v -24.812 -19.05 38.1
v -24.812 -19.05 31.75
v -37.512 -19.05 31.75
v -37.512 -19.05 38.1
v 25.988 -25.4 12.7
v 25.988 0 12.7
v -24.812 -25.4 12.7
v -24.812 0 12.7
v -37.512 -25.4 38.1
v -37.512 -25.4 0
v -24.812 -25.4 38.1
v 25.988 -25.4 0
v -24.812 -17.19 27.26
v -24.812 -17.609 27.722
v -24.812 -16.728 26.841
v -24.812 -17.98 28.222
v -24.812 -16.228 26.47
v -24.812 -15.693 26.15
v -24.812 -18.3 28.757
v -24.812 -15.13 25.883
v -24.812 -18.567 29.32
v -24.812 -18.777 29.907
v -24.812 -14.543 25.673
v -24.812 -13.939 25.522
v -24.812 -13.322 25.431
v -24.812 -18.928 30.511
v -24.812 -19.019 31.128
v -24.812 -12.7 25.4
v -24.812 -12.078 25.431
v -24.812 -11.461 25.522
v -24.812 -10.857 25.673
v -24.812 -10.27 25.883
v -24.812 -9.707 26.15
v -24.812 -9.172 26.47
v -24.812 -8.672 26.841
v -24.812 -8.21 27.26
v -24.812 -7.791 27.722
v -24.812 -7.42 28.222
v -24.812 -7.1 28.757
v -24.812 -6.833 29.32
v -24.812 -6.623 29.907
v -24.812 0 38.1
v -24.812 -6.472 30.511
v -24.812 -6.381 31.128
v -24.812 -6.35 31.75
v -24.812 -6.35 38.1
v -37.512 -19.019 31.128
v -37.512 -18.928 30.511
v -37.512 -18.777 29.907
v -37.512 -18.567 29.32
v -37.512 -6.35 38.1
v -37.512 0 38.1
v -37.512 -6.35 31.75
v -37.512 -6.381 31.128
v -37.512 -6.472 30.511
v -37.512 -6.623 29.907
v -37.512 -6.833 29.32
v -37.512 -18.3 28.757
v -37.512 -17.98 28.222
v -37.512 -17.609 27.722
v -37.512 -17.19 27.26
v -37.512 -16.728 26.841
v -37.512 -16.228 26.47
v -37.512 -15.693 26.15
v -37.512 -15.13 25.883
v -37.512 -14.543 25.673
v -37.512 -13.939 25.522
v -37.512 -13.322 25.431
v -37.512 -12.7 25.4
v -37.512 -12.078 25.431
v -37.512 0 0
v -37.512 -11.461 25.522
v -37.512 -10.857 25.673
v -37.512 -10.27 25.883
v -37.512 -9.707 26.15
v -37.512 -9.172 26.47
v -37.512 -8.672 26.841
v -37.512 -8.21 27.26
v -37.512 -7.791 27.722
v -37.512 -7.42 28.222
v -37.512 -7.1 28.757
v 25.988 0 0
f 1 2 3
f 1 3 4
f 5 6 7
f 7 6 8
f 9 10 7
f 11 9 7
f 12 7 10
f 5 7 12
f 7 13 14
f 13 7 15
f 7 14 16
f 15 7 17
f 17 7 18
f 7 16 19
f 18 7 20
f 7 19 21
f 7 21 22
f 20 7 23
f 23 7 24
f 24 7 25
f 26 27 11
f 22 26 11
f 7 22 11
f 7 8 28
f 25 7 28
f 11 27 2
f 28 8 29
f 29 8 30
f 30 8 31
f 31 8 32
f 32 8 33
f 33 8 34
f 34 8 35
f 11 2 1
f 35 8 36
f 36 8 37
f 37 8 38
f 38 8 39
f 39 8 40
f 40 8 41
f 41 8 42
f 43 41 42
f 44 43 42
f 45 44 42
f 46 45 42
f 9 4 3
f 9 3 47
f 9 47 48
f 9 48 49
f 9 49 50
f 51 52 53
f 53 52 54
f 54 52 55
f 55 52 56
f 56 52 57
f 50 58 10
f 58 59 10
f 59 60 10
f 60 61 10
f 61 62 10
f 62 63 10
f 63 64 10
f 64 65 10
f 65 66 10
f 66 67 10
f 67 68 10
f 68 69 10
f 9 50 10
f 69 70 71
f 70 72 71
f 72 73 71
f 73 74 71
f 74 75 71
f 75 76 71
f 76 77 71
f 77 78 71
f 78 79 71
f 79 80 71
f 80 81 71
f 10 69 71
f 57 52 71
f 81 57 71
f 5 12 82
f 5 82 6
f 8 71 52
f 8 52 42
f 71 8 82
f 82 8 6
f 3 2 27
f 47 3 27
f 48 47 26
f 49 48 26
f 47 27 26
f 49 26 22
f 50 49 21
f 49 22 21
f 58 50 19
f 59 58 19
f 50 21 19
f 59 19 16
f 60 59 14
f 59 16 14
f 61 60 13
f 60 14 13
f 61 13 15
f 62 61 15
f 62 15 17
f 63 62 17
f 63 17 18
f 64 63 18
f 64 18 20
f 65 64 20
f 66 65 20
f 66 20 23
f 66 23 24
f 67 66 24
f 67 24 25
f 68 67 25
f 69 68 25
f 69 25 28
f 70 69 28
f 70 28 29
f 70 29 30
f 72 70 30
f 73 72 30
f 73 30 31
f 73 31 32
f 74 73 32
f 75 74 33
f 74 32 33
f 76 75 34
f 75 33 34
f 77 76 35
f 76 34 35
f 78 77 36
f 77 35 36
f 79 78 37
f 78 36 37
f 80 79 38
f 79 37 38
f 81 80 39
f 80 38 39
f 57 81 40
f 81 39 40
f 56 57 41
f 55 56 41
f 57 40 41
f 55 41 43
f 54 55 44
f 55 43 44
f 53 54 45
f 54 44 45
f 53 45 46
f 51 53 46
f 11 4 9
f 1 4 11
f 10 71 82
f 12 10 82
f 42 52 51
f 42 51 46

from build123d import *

# Parameters (mm, degrees)
F0_W     = 12.7
F0_H     = 25.4
F1_DEPTH = 25.4
F2_DEPTH = 25.4
F3_W     = 12.7
F3_H     = 6.35
F4_DEPTH = 25.4


with BuildPart() as f1:
    # F0 (on Front) → F1 (new body)
    with BuildSketch(Plane.XZ):
        Polygon((-37.512038, 12.7), (-37.512038, 0), (25.987962, 0), (25.987962, 12.7), (-24.812038, 12.7), align=None)
        with Locations((-31.162038, 25.4)):
            Rectangle(F0_W, F0_H)
    extrude(amount=F1_DEPTH)

    # F0 (on Front) → F2 (join)
    with BuildSketch(Plane.XZ):
        Polygon((-37.512038, 12.7), (-37.512038, 0), (25.987962, 0), (25.987962, 12.7), (-24.812038, 12.7), align=None)
        with Locations((-31.162038, 25.4)):
            Rectangle(F0_W, F0_H)
    extrude(amount=F2_DEPTH)

    # F3 (on face) → F4 (cut)
    with BuildSketch(Plane.YZ.offset(-24.812038)):
        with BuildLine():
            ThreePointArc((-19.05, 31.75), (-12.7, 25.4), (-6.35, 31.75))
            Line((-6.35, 31.75), (-19.05, 31.75))
        make_face()
        with Locations((-12.7, 34.925)):
            Rectangle(F3_W, F3_H)
    extrude(amount=-F4_DEPTH, mode=Mode.SUBTRACT)


solid = f1.part
